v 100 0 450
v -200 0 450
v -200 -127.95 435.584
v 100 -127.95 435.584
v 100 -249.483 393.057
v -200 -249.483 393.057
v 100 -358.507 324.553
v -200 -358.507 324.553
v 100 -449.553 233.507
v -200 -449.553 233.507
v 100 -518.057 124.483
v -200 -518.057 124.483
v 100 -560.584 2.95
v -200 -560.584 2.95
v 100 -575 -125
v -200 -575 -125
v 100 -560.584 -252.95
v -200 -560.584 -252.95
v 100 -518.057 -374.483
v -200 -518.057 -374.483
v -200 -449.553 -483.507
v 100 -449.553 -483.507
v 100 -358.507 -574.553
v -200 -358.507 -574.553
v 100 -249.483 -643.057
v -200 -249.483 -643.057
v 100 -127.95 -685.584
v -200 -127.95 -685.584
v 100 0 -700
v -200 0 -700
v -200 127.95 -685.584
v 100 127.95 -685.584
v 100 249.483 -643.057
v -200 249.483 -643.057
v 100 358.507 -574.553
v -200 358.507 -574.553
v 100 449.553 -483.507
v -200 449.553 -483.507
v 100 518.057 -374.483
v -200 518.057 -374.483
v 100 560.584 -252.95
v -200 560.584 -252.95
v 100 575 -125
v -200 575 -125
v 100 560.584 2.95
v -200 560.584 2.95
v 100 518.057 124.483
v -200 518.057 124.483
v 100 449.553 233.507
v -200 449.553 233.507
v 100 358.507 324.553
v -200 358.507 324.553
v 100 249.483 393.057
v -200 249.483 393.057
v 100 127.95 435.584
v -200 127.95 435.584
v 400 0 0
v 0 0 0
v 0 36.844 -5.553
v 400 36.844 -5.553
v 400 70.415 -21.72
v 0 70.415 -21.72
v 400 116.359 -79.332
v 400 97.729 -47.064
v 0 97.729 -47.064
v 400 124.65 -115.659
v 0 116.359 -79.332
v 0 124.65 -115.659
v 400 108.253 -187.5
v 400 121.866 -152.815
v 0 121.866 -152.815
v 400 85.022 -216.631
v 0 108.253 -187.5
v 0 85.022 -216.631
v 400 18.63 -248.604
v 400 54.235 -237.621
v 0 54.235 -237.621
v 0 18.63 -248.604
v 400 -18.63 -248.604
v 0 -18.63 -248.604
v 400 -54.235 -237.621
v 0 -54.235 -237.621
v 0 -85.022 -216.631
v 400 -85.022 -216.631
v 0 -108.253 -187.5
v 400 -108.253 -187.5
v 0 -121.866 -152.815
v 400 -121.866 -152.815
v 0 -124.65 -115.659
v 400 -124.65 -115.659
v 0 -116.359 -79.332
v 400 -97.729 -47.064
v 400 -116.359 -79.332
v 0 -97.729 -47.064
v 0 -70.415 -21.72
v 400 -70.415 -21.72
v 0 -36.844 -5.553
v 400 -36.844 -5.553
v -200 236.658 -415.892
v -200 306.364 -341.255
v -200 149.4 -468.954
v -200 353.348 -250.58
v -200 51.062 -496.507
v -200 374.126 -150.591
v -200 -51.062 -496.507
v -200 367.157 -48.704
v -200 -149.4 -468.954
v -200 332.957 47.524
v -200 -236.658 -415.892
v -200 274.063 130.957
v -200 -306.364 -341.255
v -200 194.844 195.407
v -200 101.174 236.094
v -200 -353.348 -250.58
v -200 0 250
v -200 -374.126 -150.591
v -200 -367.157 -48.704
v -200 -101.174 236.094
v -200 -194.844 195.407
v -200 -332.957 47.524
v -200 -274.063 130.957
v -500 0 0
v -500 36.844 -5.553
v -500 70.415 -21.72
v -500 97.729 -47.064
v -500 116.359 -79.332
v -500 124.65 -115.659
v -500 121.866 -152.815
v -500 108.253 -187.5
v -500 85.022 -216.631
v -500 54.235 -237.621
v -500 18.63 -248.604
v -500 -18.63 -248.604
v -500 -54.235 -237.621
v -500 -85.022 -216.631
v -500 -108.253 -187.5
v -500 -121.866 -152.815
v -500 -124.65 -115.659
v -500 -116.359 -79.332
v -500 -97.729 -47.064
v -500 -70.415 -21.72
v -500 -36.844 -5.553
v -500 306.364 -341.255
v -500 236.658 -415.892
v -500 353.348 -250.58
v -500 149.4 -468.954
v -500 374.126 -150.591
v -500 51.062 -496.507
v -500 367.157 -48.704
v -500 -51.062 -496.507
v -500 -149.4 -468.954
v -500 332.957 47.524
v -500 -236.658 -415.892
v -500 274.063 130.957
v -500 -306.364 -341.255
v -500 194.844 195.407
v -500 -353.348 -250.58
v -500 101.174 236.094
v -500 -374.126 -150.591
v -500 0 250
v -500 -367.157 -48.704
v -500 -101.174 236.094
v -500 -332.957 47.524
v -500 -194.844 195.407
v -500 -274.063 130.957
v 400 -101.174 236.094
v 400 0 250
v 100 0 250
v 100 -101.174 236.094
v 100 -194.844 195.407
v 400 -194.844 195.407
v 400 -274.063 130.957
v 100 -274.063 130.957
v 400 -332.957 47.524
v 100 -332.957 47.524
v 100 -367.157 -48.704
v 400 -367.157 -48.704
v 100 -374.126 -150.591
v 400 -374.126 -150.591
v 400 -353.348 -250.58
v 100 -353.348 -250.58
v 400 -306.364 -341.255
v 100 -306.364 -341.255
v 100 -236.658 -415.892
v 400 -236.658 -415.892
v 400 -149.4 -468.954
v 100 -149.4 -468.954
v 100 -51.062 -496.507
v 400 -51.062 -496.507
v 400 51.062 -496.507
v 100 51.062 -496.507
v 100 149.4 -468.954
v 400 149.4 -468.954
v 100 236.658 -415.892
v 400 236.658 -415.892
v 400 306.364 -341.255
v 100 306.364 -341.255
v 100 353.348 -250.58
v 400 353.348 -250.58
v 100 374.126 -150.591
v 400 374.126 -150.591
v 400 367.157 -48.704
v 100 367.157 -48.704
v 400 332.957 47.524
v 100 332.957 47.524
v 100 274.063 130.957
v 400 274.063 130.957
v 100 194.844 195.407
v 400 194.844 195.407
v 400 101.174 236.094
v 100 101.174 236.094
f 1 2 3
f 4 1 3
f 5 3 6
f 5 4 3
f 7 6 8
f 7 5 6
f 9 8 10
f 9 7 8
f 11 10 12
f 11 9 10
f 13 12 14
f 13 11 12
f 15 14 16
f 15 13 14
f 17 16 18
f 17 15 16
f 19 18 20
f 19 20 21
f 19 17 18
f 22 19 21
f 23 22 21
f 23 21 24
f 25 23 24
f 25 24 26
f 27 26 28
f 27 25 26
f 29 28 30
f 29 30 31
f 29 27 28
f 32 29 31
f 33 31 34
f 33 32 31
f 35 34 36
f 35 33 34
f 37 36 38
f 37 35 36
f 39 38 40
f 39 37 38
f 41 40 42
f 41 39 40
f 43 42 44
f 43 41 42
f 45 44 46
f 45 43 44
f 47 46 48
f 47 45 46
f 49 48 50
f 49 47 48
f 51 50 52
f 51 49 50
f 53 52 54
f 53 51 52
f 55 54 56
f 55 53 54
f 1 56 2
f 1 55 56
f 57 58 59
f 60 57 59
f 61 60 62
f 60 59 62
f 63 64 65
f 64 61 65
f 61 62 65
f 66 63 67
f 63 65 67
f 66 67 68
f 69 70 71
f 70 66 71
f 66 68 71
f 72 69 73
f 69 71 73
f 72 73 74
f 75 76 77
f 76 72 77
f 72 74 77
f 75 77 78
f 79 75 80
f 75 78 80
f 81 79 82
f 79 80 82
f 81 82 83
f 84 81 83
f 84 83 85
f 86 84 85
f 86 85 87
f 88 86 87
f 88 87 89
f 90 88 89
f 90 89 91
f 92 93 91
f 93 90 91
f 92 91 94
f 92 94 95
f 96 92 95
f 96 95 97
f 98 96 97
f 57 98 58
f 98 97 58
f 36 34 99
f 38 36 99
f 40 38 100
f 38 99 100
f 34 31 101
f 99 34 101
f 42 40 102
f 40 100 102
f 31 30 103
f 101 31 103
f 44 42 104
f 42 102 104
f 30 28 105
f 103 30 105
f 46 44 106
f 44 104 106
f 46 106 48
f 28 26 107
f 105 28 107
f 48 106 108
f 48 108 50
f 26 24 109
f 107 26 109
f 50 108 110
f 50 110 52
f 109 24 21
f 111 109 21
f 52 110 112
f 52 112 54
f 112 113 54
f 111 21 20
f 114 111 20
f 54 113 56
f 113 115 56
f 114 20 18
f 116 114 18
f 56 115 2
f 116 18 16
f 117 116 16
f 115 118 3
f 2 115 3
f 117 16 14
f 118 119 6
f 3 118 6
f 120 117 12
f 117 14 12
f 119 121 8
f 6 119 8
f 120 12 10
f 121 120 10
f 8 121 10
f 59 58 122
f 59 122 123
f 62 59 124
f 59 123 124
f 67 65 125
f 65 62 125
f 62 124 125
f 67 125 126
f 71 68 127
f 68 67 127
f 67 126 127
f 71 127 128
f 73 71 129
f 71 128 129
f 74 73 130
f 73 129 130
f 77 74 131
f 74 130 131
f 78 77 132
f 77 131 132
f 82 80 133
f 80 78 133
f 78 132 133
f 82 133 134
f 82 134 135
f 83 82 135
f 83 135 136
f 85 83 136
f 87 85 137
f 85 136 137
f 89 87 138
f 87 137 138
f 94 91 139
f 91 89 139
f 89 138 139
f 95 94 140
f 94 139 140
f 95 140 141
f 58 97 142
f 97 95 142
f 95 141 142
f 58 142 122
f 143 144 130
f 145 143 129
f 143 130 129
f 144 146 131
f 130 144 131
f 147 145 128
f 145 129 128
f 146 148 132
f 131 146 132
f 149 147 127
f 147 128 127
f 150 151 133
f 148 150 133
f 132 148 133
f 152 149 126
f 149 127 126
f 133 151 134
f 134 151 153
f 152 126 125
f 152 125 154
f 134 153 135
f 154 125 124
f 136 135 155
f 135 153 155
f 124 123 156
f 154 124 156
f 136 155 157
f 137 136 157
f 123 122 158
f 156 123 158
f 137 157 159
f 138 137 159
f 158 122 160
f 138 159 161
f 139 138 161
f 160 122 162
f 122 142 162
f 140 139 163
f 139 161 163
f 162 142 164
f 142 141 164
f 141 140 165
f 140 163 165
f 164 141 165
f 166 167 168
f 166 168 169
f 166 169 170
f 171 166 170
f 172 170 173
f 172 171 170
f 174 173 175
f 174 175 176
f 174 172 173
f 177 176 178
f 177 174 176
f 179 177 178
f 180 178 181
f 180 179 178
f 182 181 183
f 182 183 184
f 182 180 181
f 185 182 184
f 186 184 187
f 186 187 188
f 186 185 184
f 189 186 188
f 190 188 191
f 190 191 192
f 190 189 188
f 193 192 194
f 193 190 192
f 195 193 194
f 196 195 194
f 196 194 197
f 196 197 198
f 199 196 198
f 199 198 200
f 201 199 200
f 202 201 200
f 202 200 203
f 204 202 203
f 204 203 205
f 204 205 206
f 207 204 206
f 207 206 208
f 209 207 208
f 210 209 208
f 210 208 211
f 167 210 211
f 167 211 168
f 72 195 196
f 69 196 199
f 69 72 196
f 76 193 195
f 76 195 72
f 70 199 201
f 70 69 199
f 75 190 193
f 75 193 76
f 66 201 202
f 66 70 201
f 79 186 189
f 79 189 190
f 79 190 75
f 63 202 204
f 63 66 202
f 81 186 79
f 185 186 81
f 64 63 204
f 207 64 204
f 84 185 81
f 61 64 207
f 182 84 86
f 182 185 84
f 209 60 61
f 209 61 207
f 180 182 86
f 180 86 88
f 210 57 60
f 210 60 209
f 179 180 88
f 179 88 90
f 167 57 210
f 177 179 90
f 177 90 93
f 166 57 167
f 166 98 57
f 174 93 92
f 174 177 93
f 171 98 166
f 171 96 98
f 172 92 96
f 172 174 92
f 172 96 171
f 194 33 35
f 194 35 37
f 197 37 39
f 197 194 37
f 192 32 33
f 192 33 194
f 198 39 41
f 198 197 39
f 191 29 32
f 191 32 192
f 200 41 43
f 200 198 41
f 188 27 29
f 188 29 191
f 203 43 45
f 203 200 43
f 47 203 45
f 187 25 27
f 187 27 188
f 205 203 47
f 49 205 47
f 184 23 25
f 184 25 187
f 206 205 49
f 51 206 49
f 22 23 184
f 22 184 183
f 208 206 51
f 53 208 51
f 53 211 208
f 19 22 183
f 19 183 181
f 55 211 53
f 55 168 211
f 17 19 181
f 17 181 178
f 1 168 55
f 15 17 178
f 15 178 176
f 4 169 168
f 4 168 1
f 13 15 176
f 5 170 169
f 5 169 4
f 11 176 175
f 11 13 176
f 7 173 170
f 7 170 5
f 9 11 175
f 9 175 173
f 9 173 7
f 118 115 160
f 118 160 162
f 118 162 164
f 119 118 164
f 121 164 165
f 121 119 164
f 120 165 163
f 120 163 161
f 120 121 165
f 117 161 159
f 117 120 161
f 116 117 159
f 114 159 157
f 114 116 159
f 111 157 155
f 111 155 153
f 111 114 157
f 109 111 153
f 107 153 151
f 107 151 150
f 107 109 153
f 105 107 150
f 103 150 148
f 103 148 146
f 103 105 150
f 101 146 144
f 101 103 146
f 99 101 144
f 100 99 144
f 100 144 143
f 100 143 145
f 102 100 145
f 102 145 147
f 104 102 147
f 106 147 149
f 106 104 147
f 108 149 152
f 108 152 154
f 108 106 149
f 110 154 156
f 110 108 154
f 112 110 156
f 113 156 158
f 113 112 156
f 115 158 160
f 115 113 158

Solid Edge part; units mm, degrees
sketch "Sketch1" plane through (0, 0, 0) normal (0, -1, 0) x (1, 0, 0)
  line L0 (-200, 250) -> (-200, 450)
  line L1 (-200, 450) -> (100, 450)
  line L2 (100, 450) -> (100, 250)
  line L3 (100, 250) -> (400, 250)
  line L4 (400, 250) -> (400, 0)
  line L5 (400, 0) -> (0, 0)
  line L6 (0, 0) -> (-500, 0)
  line L7 (-500, 0) -> (-500, 250)
  line L8 (-500, 250) -> (-200, 250)
revolve "RevolvedProtrusion1" add sketch "Sketch1" angle 360 about axis through (-500, 0, -125) along (1, 0, 0)
